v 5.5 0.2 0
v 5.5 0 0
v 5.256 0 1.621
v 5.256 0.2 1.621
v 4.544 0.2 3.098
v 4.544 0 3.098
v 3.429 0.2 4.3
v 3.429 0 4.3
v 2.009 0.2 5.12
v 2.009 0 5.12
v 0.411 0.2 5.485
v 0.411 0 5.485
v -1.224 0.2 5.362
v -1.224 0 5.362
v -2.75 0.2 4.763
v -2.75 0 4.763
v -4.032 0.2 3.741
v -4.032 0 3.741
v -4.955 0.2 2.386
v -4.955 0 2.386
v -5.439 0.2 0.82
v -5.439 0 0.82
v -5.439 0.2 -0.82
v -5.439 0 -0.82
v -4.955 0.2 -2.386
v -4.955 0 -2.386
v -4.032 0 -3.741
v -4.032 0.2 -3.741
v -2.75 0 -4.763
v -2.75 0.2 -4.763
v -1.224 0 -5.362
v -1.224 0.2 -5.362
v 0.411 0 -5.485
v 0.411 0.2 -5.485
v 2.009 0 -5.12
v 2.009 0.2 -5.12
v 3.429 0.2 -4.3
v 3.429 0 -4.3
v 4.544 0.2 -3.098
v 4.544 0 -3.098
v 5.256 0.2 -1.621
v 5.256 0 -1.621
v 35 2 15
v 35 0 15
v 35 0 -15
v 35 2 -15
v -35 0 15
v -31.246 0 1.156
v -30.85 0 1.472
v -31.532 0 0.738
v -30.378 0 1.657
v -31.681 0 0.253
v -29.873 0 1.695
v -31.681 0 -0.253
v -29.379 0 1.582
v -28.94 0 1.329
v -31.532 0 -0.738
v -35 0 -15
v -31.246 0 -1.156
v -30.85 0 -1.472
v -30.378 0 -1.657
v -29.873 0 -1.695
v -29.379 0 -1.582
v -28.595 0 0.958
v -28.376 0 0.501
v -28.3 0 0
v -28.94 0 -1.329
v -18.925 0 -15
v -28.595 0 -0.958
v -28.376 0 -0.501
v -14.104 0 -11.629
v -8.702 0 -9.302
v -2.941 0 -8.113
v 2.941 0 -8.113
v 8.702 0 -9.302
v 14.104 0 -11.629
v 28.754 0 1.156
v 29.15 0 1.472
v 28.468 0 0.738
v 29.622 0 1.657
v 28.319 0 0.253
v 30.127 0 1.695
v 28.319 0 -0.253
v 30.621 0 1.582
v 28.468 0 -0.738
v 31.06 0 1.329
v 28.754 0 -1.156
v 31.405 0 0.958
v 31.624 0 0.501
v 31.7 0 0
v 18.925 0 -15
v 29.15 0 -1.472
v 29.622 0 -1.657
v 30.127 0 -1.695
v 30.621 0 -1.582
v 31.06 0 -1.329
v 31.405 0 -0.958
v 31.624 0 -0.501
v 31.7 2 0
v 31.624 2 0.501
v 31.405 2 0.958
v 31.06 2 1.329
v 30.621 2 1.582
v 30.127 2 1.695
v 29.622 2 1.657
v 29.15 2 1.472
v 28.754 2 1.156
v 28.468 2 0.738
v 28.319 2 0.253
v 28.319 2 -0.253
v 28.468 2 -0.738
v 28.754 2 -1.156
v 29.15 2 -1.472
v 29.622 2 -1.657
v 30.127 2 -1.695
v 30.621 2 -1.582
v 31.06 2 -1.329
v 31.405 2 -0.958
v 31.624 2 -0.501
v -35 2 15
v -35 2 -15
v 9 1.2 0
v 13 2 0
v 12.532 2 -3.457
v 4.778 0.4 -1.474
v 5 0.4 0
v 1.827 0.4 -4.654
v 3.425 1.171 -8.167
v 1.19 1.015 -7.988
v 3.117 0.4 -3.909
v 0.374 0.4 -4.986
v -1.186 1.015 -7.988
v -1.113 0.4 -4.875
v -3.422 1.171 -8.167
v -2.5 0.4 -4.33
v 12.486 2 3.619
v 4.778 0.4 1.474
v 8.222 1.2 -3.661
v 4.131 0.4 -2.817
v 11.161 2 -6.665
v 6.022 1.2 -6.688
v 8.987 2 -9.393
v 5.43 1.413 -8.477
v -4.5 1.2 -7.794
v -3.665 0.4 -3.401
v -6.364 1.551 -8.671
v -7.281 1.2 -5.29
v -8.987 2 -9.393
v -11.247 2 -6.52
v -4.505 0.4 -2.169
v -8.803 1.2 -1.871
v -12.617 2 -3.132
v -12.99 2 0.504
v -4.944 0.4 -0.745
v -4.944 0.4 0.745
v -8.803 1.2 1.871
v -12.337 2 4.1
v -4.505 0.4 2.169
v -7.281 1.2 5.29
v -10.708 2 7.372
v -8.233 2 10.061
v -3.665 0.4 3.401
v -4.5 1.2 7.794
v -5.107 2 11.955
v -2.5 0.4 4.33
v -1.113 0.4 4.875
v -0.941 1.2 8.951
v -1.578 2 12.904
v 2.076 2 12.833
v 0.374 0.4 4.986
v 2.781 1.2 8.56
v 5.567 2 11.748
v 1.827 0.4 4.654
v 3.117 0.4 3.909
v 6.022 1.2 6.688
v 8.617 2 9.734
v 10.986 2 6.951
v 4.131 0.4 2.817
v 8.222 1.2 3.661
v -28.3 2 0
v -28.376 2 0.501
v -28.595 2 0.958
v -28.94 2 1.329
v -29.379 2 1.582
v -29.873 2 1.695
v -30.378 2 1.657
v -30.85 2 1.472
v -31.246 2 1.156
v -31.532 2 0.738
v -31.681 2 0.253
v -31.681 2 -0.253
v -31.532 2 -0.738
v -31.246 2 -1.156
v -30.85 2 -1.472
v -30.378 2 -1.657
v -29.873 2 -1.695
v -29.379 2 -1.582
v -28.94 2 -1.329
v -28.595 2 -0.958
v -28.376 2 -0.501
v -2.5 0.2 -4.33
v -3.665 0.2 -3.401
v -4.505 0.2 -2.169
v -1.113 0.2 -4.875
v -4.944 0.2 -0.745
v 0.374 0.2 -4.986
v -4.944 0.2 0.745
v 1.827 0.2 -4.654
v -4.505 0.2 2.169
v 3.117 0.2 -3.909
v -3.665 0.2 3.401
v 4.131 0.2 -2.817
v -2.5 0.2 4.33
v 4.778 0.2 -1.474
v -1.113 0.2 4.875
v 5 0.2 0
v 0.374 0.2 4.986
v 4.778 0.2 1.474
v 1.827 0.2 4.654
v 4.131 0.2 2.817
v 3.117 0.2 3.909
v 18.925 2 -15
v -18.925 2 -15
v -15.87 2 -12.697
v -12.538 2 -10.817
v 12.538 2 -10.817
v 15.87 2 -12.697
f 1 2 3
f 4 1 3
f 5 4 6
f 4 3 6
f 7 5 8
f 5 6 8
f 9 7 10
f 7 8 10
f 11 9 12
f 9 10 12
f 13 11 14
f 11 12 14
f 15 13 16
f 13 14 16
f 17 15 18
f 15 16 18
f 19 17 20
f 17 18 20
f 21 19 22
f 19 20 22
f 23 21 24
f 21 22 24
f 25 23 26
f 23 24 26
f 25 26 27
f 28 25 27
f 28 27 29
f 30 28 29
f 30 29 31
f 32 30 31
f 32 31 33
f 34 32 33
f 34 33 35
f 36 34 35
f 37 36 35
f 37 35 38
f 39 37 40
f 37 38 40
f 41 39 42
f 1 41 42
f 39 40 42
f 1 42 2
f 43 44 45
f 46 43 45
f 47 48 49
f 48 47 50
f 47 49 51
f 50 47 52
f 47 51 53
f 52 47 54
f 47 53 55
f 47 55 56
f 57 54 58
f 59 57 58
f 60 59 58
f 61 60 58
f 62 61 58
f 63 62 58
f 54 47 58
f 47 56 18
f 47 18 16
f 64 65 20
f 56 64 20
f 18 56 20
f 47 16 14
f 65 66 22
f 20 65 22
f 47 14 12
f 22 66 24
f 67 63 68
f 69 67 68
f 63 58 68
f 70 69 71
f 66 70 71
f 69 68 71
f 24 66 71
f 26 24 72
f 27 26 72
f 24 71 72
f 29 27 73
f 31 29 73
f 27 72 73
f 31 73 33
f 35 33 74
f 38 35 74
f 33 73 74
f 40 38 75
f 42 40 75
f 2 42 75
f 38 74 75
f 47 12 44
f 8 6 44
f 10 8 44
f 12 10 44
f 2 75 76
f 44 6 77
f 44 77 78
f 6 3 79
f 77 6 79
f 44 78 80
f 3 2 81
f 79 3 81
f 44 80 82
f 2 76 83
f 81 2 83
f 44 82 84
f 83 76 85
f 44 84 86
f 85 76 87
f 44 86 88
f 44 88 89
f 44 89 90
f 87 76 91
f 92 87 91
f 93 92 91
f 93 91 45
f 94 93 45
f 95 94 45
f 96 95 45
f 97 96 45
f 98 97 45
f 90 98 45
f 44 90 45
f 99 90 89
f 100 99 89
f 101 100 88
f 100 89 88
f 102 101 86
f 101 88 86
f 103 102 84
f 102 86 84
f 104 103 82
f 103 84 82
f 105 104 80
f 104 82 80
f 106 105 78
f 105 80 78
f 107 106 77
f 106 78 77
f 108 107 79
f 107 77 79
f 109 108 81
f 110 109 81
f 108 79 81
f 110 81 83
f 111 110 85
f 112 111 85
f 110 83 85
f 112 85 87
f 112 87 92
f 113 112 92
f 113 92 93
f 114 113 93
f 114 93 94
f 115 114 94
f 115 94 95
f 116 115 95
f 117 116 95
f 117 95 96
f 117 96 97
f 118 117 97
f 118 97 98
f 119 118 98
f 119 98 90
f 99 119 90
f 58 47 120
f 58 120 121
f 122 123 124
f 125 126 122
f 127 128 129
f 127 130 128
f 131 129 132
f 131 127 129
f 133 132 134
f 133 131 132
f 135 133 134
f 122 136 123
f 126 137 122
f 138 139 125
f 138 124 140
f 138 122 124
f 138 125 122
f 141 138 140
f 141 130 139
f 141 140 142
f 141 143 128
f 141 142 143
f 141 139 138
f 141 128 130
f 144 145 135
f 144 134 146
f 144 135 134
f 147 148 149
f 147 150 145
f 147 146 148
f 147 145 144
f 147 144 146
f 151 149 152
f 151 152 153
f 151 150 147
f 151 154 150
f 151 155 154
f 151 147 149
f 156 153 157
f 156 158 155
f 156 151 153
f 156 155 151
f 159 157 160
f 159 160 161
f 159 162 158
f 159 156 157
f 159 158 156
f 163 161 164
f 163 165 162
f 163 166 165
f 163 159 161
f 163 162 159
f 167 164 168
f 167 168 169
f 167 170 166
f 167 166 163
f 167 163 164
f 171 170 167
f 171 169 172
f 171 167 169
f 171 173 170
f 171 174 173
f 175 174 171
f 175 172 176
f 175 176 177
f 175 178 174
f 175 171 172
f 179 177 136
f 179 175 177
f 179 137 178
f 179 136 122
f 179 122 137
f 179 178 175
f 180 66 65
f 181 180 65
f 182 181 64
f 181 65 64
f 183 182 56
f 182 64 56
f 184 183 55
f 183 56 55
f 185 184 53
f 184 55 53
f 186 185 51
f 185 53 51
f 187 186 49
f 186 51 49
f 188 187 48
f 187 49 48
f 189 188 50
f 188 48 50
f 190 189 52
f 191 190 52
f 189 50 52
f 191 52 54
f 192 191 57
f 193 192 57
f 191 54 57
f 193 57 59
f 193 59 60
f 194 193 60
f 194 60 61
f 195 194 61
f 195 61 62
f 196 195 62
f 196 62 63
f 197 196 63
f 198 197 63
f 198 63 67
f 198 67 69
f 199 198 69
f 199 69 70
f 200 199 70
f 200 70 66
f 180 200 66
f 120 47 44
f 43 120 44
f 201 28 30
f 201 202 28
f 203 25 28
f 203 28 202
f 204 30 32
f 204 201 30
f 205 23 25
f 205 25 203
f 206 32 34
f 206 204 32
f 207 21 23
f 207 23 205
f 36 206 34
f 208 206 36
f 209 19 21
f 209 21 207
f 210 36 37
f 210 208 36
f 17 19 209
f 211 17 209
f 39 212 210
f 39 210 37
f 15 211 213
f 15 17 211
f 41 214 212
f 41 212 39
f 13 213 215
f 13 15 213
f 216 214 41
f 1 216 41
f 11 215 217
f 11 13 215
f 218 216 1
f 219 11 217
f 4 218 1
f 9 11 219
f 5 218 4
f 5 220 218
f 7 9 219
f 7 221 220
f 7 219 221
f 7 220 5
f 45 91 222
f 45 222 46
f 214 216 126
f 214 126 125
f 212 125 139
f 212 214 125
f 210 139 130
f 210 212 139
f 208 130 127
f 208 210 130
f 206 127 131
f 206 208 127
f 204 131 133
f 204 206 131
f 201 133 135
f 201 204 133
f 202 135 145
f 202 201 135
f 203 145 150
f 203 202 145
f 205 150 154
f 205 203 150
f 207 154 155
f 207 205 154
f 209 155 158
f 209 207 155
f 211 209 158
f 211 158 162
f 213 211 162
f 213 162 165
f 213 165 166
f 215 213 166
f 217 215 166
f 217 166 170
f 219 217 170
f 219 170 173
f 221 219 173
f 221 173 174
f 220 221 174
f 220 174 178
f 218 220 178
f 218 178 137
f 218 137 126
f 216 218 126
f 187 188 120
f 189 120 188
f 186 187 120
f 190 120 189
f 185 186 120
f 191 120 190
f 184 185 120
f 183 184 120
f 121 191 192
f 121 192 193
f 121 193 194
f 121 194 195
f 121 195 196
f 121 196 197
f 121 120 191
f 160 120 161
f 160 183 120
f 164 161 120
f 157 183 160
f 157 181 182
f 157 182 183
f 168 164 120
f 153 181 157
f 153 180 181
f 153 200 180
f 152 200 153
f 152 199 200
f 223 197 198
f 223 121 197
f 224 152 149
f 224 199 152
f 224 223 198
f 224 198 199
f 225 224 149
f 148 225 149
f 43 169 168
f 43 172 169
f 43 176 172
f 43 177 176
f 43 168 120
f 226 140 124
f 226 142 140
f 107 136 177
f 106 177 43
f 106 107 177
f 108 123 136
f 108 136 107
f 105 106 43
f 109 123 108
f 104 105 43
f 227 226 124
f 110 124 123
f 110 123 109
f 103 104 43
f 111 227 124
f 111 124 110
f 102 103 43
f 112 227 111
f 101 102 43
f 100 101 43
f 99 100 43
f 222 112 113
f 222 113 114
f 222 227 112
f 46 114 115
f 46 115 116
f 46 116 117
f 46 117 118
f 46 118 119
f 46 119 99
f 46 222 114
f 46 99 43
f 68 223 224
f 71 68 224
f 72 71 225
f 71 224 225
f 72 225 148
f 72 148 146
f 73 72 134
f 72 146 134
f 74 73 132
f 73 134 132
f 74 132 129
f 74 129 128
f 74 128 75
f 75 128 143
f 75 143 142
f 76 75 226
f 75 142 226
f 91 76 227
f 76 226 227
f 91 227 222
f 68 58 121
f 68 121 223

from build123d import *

# Parameters (mm, degrees)
SKETCH1_W            = 70
SKETCH1_H            = 30
SKETCH1_R            = 5
EXTRUDE1_DEPTH       = 2
CHAMFER1_SIZE        = 8
CHAMFER1_SIZE2       = 1.6
SKETCH3_R            = 5.5
CUT_EXTRUDE1_DEPTH   = 0.2
M3_CLEARANCE_HOLE1_D = 3.4
SKETCH7_R            = 28.969188929
CUT_EXTRUDE2_DEPTH   = 3


with BuildPart() as part:
    # Sketch1 → Extrude1 (new body)
    with BuildSketch(Plane(origin=(0, 0, 0), x_dir=(1, 0, 0), z_dir=(0, 1, 0))):
        Rectangle(SKETCH1_W, SKETCH1_H)
        Circle(SKETCH1_R, mode=Mode.SUBTRACT)
    extrude(amount=EXTRUDE1_DEPTH)

    # Chamfer1
    chamfer1_edges = [part.edges().sort_by_distance(p)[0] for p in [
        (-5, 2, 0),
    ]]
    chamfer1_side = [part.faces().sort_by_distance(p)[0] for p in [
        (0, 2, -14.238422689),
    ]]
    chamfer(chamfer1_edges, length=CHAMFER1_SIZE, length2=CHAMFER1_SIZE2, reference=chamfer1_side[0])

    # Sketch3 → Cut-Extrude1 (cut)
    with BuildSketch(Plane.XZ):
        Circle(SKETCH3_R)
    extrude(amount=-CUT_EXTRUDE1_DEPTH, mode=Mode.SUBTRACT)

    # M3 Clearance Hole1 (through all)
    with Locations(Plane(origin=(0, 2, 0), x_dir=(-1, 0, 0), z_dir=(0, 1, 0))):
        with Locations((-30, 0), (30, 0)):
            Hole(M3_CLEARANCE_HOLE1_D / 2)

    # Sketch7 → Cut-Extrude2 (cut, through all)
    with BuildSketch(Plane(origin=(0, 2, 0), x_dir=(-1, 0, 0), z_dir=(0, 1, 0))):
        with Locations((0, -36.93290324)):
            Circle(SKETCH7_R)
    extrude(amount=-CUT_EXTRUDE2_DEPTH, mode=Mode.SUBTRACT)


solid = part.part
